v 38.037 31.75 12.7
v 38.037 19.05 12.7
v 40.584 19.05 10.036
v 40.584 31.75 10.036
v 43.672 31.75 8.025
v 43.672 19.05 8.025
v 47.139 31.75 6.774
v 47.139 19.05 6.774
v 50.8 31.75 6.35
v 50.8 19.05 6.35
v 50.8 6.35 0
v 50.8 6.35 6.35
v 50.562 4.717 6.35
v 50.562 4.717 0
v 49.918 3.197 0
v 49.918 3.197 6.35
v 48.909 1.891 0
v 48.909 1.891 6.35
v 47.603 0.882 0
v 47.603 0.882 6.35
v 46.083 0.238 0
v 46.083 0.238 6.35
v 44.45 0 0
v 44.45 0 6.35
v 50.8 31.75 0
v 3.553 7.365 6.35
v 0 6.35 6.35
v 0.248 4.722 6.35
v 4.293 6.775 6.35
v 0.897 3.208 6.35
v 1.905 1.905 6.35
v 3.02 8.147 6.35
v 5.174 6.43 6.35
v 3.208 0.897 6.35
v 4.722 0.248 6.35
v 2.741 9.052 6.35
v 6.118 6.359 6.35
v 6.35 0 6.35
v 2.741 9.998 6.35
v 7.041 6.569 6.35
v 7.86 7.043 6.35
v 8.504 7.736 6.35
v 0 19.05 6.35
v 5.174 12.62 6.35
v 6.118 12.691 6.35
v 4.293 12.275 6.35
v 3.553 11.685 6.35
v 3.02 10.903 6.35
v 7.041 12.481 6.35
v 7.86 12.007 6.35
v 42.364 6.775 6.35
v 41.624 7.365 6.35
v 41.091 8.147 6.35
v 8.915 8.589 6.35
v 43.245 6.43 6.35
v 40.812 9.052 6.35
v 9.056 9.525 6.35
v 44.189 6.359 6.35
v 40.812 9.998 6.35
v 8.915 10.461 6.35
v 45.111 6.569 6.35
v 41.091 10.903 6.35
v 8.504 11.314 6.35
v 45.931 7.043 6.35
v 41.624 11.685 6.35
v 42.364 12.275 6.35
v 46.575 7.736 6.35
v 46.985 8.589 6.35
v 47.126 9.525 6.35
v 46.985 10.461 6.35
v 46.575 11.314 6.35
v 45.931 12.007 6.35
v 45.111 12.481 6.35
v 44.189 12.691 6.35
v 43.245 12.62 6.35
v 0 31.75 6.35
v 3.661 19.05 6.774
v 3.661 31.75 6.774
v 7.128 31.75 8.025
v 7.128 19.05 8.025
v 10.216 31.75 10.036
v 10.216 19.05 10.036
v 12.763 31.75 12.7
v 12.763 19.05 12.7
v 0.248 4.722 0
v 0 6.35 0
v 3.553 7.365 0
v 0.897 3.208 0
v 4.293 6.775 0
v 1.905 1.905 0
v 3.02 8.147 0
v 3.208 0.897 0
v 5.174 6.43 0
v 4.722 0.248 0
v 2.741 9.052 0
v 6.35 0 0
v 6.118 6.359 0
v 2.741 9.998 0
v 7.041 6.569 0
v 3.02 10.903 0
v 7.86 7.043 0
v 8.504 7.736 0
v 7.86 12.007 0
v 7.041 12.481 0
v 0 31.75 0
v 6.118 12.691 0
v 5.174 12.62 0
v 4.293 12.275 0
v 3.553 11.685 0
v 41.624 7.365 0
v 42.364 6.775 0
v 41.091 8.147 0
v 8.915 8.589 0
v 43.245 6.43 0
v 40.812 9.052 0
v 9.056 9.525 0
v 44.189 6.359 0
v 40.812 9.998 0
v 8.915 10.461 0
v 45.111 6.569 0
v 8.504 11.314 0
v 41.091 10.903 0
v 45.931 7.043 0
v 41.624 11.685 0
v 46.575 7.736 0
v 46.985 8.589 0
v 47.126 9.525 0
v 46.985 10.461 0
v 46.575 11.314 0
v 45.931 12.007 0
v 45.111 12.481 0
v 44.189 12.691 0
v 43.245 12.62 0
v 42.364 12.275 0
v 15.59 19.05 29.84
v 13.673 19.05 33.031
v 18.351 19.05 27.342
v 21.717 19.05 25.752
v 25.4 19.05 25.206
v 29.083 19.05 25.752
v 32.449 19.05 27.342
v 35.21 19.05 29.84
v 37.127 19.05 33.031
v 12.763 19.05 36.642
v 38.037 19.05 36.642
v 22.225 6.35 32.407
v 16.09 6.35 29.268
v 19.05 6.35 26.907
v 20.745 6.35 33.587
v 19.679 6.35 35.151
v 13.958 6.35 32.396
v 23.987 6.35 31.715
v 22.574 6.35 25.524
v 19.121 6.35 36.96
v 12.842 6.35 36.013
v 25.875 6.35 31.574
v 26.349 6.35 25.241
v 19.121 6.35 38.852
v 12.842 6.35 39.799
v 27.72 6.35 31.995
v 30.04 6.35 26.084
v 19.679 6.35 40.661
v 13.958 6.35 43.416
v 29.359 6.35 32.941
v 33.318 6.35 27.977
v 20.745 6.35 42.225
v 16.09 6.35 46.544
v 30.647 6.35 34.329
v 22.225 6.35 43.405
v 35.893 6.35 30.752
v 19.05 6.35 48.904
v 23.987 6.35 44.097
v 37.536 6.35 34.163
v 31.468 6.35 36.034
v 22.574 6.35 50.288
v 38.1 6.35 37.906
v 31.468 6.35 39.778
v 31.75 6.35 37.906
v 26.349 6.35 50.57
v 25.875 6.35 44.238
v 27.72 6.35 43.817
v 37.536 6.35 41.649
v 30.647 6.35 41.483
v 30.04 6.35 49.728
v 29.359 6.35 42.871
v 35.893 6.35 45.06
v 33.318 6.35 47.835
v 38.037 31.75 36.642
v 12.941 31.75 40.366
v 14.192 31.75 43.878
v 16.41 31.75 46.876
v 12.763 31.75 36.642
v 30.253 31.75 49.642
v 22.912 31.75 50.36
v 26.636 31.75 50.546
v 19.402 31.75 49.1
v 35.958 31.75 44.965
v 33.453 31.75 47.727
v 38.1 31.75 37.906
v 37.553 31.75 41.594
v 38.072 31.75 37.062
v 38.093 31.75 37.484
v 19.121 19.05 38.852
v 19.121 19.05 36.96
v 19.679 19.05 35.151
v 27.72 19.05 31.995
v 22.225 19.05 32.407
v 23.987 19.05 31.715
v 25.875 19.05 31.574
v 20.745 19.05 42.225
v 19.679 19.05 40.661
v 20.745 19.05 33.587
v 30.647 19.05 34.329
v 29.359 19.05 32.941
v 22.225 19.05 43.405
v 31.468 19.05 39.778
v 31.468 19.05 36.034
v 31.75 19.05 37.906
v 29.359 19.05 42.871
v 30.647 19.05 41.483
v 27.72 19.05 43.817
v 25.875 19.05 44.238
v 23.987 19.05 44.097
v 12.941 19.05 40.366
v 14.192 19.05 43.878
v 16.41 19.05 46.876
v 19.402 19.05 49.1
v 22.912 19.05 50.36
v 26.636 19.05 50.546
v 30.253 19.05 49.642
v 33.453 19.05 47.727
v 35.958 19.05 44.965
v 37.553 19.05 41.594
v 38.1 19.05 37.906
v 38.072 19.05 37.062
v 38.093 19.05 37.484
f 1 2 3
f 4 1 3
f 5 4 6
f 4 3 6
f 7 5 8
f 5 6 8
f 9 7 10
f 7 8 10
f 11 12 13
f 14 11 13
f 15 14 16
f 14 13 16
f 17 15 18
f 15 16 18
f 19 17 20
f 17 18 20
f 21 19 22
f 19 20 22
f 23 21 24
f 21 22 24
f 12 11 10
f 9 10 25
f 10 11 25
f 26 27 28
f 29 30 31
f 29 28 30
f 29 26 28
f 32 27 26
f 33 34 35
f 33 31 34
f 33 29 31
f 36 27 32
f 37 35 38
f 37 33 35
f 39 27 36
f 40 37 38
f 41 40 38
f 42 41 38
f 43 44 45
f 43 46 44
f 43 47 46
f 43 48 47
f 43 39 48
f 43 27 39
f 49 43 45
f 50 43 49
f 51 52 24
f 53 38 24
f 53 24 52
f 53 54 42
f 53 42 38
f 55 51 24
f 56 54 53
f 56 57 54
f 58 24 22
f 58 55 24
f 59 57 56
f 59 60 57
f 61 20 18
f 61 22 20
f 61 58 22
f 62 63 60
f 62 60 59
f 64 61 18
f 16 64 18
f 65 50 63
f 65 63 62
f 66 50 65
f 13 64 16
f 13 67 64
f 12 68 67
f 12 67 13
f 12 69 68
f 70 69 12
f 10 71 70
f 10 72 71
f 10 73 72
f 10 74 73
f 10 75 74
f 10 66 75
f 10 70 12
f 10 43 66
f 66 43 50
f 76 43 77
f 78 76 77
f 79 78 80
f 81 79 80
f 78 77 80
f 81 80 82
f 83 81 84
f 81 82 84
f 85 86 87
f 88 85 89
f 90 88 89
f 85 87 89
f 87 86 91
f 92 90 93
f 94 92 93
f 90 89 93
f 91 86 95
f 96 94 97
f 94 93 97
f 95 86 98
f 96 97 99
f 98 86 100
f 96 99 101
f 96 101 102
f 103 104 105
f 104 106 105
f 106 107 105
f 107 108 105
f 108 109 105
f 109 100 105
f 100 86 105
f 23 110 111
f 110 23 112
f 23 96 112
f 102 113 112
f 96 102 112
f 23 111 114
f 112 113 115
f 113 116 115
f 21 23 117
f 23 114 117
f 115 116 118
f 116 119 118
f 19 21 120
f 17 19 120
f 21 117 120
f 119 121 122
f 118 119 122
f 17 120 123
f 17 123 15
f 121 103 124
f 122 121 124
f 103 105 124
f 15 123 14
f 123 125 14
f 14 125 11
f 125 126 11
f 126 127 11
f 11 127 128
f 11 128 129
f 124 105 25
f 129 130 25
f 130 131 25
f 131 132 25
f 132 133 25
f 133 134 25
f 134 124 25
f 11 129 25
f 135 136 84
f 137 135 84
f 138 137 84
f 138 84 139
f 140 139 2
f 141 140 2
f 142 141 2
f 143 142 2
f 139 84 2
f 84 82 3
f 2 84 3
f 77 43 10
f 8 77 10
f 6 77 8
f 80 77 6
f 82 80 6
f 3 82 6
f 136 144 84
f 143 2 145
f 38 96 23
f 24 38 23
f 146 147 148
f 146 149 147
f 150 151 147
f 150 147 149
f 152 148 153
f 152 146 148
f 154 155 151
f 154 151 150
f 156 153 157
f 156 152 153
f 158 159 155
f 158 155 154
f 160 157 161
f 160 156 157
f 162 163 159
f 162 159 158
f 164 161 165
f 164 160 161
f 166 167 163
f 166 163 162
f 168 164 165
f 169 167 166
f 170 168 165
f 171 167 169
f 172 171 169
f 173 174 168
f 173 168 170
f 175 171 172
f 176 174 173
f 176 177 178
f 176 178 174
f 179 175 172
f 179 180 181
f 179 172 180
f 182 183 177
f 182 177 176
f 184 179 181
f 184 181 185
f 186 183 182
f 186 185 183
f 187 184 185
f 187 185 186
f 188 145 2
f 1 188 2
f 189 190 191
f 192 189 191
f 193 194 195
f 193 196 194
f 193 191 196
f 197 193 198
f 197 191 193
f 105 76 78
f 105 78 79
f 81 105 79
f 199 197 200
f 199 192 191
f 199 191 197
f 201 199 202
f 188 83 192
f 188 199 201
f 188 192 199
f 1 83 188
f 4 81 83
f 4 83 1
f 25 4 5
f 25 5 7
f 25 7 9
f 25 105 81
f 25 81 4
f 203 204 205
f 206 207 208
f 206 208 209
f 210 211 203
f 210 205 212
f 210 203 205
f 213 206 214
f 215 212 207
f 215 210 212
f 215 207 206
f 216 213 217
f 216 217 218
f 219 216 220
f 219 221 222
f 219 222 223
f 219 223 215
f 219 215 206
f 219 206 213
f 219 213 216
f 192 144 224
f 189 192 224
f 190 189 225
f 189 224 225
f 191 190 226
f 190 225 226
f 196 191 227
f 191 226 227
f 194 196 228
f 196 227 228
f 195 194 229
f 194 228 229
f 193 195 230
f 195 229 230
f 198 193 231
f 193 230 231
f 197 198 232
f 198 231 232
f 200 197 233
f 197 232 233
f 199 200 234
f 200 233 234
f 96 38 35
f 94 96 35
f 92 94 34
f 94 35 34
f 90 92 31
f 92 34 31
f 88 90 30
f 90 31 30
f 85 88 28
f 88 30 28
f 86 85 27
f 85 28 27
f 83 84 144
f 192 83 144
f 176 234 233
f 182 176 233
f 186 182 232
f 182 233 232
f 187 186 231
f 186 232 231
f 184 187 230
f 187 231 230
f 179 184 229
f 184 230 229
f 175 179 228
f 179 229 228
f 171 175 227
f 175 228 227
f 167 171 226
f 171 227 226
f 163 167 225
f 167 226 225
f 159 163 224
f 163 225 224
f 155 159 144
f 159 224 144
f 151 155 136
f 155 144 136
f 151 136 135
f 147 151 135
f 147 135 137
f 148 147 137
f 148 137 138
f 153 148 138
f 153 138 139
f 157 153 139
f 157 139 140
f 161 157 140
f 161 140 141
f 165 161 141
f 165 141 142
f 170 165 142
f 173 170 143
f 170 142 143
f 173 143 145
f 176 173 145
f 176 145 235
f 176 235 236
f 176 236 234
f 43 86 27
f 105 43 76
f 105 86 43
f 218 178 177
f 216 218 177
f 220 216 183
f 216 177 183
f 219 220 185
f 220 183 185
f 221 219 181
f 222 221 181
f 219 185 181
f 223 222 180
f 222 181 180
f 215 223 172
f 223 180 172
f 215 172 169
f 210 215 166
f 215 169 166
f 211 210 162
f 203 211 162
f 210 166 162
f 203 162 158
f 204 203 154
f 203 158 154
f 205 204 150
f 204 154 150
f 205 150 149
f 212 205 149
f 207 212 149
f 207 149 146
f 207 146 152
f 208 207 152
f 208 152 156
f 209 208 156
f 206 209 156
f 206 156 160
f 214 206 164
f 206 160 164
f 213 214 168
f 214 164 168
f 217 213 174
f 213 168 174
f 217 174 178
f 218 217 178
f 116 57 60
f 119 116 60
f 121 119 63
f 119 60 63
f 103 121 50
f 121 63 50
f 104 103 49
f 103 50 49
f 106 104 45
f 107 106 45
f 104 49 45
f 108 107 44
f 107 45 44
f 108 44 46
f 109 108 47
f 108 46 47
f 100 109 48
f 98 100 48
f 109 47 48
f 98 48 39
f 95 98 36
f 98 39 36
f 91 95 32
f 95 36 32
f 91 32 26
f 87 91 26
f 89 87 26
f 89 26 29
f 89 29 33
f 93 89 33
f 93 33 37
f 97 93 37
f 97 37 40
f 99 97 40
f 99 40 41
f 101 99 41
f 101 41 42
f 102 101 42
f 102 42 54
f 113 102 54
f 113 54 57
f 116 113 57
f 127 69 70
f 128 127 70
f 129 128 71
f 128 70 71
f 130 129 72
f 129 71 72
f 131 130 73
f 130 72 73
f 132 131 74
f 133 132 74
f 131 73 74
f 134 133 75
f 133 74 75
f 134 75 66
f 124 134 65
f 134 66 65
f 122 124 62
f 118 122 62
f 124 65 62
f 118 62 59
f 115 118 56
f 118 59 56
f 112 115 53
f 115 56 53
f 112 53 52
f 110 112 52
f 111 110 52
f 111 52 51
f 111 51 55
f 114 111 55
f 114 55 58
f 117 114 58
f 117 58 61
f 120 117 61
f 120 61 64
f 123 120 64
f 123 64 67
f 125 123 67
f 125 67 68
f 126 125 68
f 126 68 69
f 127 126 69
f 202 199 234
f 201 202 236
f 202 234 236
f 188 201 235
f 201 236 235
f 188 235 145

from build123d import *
from build123d import SkipClean  # not in build123d's __all__

# Parameters (mm, degrees)
F0_W      = 50.8
F0_H      = 31.75
F1_DEPTH  = 6.35
F2_W      = 50.8
F2_H      = 12.7
F3_DEPTH  = 44.45
F4_R      = 12.7
F5_DEPTH  = 12.7
F6_R      = 6.35
F7_DEPTH  = 12.7
F8_R      = 3.175
F9_DEPTH  = 25.4
F11_DEPTH = 25.4
F13_DEPTH = 25.4


with BuildPart() as f1:
    # F0 (on Top) → F1 (new body)
    with BuildSketch(Plane.XY):
        with Locations((25.4, 15.875)):
            Rectangle(F0_W, F0_H)
    extrude(amount=F1_DEPTH)

    # F2 (on face) → F3 (join)
    with BuildSketch(Plane.XY.offset(6.35)):
        with Locations((25.4, 25.4)):
            Rectangle(F2_W, F2_H)
    extrude(amount=F3_DEPTH)

    # F4 (on face) → F5 (join)
    with BuildSketch(Plane.XZ.offset(-19.05)):
        with Locations((25.4, 37.9059378386)):
            Circle(F4_R)
    extrude(amount=F5_DEPTH)

    # F6 (on face) → F7 (cut)
    with BuildSketch(Plane.XZ.offset(-6.35)):
        with Locations((25.4, 37.9059378386)):
            Circle(F6_R)
    extrude(amount=-F7_DEPTH, mode=Mode.SUBTRACT)

    # F8 (on face) → F9 (cut)
    with BuildSketch(Plane.XY.offset(6.35)):
        with Locations((5.8808145113, 9.525)):
            Circle(F8_R)
        with Locations((43.9513325691, 9.525)):
            Circle(F8_R)
    extrude(amount=-F9_DEPTH, mode=Mode.SUBTRACT)

    # F10 (on face) → F11 (cut)
    with BuildSketch(Plane.XY.offset(6.35)):
        with BuildLine():
            ThreePointArc((50.8, 6.35), (48.9094635793, 1.8905364207), (44.45, 0))
            Line((44.45, 0), (50.8, 0))
            Line((50.8, 0), (50.8, 6.35))
        make_face()
        with BuildLine():
            ThreePointArc((6.35, 0), (1.9050641376, 1.9050641376), (0, 6.35))
            Line((0, 6.35), (0, 0))
            Line((0, 0), (6.35, 0))
        make_face()
    extrude(amount=-F11_DEPTH, mode=Mode.SUBTRACT)

    # F12 (on face) → F13 (cut)
    with BuildSketch(Plane.XZ.offset(-19.05)):
        with BuildLine():
            ThreePointArc((38.1, 37.9059378386), (38.084216594, 37.2729691208), (38.0369056067, 36.6415736948))
            Line((38.0369056067, 36.6415736948), (38.0369056067, 12.7))
            ThreePointArc((38.0369056067, 12.7), (43.6722535382, 8.0251871407), (50.8, 6.35))
            Line((50.8, 6.35), (50.8, 50.8))
            Line((50.8, 50.8), (0, 50.8))
            Line((0, 50.8), (0, 6.35))
            ThreePointArc((0, 6.35), (7.1277464618, 8.0251871407), (12.7630943933, 12.7))
            Line((12.7630943933, 12.7), (12.7630943933, 36.6415736948))
            ThreePointArc((12.7630943933, 36.6415736948), (24.7670312823, 50.5901544325), (38.1, 37.9059378386))
        make_face()
    with SkipClean():  # cleaning this boolean's faces spoils the solid; the shape is the same uncleaned
        extrude(amount=-F13_DEPTH, mode=Mode.SUBTRACT)


solid = f1.part
